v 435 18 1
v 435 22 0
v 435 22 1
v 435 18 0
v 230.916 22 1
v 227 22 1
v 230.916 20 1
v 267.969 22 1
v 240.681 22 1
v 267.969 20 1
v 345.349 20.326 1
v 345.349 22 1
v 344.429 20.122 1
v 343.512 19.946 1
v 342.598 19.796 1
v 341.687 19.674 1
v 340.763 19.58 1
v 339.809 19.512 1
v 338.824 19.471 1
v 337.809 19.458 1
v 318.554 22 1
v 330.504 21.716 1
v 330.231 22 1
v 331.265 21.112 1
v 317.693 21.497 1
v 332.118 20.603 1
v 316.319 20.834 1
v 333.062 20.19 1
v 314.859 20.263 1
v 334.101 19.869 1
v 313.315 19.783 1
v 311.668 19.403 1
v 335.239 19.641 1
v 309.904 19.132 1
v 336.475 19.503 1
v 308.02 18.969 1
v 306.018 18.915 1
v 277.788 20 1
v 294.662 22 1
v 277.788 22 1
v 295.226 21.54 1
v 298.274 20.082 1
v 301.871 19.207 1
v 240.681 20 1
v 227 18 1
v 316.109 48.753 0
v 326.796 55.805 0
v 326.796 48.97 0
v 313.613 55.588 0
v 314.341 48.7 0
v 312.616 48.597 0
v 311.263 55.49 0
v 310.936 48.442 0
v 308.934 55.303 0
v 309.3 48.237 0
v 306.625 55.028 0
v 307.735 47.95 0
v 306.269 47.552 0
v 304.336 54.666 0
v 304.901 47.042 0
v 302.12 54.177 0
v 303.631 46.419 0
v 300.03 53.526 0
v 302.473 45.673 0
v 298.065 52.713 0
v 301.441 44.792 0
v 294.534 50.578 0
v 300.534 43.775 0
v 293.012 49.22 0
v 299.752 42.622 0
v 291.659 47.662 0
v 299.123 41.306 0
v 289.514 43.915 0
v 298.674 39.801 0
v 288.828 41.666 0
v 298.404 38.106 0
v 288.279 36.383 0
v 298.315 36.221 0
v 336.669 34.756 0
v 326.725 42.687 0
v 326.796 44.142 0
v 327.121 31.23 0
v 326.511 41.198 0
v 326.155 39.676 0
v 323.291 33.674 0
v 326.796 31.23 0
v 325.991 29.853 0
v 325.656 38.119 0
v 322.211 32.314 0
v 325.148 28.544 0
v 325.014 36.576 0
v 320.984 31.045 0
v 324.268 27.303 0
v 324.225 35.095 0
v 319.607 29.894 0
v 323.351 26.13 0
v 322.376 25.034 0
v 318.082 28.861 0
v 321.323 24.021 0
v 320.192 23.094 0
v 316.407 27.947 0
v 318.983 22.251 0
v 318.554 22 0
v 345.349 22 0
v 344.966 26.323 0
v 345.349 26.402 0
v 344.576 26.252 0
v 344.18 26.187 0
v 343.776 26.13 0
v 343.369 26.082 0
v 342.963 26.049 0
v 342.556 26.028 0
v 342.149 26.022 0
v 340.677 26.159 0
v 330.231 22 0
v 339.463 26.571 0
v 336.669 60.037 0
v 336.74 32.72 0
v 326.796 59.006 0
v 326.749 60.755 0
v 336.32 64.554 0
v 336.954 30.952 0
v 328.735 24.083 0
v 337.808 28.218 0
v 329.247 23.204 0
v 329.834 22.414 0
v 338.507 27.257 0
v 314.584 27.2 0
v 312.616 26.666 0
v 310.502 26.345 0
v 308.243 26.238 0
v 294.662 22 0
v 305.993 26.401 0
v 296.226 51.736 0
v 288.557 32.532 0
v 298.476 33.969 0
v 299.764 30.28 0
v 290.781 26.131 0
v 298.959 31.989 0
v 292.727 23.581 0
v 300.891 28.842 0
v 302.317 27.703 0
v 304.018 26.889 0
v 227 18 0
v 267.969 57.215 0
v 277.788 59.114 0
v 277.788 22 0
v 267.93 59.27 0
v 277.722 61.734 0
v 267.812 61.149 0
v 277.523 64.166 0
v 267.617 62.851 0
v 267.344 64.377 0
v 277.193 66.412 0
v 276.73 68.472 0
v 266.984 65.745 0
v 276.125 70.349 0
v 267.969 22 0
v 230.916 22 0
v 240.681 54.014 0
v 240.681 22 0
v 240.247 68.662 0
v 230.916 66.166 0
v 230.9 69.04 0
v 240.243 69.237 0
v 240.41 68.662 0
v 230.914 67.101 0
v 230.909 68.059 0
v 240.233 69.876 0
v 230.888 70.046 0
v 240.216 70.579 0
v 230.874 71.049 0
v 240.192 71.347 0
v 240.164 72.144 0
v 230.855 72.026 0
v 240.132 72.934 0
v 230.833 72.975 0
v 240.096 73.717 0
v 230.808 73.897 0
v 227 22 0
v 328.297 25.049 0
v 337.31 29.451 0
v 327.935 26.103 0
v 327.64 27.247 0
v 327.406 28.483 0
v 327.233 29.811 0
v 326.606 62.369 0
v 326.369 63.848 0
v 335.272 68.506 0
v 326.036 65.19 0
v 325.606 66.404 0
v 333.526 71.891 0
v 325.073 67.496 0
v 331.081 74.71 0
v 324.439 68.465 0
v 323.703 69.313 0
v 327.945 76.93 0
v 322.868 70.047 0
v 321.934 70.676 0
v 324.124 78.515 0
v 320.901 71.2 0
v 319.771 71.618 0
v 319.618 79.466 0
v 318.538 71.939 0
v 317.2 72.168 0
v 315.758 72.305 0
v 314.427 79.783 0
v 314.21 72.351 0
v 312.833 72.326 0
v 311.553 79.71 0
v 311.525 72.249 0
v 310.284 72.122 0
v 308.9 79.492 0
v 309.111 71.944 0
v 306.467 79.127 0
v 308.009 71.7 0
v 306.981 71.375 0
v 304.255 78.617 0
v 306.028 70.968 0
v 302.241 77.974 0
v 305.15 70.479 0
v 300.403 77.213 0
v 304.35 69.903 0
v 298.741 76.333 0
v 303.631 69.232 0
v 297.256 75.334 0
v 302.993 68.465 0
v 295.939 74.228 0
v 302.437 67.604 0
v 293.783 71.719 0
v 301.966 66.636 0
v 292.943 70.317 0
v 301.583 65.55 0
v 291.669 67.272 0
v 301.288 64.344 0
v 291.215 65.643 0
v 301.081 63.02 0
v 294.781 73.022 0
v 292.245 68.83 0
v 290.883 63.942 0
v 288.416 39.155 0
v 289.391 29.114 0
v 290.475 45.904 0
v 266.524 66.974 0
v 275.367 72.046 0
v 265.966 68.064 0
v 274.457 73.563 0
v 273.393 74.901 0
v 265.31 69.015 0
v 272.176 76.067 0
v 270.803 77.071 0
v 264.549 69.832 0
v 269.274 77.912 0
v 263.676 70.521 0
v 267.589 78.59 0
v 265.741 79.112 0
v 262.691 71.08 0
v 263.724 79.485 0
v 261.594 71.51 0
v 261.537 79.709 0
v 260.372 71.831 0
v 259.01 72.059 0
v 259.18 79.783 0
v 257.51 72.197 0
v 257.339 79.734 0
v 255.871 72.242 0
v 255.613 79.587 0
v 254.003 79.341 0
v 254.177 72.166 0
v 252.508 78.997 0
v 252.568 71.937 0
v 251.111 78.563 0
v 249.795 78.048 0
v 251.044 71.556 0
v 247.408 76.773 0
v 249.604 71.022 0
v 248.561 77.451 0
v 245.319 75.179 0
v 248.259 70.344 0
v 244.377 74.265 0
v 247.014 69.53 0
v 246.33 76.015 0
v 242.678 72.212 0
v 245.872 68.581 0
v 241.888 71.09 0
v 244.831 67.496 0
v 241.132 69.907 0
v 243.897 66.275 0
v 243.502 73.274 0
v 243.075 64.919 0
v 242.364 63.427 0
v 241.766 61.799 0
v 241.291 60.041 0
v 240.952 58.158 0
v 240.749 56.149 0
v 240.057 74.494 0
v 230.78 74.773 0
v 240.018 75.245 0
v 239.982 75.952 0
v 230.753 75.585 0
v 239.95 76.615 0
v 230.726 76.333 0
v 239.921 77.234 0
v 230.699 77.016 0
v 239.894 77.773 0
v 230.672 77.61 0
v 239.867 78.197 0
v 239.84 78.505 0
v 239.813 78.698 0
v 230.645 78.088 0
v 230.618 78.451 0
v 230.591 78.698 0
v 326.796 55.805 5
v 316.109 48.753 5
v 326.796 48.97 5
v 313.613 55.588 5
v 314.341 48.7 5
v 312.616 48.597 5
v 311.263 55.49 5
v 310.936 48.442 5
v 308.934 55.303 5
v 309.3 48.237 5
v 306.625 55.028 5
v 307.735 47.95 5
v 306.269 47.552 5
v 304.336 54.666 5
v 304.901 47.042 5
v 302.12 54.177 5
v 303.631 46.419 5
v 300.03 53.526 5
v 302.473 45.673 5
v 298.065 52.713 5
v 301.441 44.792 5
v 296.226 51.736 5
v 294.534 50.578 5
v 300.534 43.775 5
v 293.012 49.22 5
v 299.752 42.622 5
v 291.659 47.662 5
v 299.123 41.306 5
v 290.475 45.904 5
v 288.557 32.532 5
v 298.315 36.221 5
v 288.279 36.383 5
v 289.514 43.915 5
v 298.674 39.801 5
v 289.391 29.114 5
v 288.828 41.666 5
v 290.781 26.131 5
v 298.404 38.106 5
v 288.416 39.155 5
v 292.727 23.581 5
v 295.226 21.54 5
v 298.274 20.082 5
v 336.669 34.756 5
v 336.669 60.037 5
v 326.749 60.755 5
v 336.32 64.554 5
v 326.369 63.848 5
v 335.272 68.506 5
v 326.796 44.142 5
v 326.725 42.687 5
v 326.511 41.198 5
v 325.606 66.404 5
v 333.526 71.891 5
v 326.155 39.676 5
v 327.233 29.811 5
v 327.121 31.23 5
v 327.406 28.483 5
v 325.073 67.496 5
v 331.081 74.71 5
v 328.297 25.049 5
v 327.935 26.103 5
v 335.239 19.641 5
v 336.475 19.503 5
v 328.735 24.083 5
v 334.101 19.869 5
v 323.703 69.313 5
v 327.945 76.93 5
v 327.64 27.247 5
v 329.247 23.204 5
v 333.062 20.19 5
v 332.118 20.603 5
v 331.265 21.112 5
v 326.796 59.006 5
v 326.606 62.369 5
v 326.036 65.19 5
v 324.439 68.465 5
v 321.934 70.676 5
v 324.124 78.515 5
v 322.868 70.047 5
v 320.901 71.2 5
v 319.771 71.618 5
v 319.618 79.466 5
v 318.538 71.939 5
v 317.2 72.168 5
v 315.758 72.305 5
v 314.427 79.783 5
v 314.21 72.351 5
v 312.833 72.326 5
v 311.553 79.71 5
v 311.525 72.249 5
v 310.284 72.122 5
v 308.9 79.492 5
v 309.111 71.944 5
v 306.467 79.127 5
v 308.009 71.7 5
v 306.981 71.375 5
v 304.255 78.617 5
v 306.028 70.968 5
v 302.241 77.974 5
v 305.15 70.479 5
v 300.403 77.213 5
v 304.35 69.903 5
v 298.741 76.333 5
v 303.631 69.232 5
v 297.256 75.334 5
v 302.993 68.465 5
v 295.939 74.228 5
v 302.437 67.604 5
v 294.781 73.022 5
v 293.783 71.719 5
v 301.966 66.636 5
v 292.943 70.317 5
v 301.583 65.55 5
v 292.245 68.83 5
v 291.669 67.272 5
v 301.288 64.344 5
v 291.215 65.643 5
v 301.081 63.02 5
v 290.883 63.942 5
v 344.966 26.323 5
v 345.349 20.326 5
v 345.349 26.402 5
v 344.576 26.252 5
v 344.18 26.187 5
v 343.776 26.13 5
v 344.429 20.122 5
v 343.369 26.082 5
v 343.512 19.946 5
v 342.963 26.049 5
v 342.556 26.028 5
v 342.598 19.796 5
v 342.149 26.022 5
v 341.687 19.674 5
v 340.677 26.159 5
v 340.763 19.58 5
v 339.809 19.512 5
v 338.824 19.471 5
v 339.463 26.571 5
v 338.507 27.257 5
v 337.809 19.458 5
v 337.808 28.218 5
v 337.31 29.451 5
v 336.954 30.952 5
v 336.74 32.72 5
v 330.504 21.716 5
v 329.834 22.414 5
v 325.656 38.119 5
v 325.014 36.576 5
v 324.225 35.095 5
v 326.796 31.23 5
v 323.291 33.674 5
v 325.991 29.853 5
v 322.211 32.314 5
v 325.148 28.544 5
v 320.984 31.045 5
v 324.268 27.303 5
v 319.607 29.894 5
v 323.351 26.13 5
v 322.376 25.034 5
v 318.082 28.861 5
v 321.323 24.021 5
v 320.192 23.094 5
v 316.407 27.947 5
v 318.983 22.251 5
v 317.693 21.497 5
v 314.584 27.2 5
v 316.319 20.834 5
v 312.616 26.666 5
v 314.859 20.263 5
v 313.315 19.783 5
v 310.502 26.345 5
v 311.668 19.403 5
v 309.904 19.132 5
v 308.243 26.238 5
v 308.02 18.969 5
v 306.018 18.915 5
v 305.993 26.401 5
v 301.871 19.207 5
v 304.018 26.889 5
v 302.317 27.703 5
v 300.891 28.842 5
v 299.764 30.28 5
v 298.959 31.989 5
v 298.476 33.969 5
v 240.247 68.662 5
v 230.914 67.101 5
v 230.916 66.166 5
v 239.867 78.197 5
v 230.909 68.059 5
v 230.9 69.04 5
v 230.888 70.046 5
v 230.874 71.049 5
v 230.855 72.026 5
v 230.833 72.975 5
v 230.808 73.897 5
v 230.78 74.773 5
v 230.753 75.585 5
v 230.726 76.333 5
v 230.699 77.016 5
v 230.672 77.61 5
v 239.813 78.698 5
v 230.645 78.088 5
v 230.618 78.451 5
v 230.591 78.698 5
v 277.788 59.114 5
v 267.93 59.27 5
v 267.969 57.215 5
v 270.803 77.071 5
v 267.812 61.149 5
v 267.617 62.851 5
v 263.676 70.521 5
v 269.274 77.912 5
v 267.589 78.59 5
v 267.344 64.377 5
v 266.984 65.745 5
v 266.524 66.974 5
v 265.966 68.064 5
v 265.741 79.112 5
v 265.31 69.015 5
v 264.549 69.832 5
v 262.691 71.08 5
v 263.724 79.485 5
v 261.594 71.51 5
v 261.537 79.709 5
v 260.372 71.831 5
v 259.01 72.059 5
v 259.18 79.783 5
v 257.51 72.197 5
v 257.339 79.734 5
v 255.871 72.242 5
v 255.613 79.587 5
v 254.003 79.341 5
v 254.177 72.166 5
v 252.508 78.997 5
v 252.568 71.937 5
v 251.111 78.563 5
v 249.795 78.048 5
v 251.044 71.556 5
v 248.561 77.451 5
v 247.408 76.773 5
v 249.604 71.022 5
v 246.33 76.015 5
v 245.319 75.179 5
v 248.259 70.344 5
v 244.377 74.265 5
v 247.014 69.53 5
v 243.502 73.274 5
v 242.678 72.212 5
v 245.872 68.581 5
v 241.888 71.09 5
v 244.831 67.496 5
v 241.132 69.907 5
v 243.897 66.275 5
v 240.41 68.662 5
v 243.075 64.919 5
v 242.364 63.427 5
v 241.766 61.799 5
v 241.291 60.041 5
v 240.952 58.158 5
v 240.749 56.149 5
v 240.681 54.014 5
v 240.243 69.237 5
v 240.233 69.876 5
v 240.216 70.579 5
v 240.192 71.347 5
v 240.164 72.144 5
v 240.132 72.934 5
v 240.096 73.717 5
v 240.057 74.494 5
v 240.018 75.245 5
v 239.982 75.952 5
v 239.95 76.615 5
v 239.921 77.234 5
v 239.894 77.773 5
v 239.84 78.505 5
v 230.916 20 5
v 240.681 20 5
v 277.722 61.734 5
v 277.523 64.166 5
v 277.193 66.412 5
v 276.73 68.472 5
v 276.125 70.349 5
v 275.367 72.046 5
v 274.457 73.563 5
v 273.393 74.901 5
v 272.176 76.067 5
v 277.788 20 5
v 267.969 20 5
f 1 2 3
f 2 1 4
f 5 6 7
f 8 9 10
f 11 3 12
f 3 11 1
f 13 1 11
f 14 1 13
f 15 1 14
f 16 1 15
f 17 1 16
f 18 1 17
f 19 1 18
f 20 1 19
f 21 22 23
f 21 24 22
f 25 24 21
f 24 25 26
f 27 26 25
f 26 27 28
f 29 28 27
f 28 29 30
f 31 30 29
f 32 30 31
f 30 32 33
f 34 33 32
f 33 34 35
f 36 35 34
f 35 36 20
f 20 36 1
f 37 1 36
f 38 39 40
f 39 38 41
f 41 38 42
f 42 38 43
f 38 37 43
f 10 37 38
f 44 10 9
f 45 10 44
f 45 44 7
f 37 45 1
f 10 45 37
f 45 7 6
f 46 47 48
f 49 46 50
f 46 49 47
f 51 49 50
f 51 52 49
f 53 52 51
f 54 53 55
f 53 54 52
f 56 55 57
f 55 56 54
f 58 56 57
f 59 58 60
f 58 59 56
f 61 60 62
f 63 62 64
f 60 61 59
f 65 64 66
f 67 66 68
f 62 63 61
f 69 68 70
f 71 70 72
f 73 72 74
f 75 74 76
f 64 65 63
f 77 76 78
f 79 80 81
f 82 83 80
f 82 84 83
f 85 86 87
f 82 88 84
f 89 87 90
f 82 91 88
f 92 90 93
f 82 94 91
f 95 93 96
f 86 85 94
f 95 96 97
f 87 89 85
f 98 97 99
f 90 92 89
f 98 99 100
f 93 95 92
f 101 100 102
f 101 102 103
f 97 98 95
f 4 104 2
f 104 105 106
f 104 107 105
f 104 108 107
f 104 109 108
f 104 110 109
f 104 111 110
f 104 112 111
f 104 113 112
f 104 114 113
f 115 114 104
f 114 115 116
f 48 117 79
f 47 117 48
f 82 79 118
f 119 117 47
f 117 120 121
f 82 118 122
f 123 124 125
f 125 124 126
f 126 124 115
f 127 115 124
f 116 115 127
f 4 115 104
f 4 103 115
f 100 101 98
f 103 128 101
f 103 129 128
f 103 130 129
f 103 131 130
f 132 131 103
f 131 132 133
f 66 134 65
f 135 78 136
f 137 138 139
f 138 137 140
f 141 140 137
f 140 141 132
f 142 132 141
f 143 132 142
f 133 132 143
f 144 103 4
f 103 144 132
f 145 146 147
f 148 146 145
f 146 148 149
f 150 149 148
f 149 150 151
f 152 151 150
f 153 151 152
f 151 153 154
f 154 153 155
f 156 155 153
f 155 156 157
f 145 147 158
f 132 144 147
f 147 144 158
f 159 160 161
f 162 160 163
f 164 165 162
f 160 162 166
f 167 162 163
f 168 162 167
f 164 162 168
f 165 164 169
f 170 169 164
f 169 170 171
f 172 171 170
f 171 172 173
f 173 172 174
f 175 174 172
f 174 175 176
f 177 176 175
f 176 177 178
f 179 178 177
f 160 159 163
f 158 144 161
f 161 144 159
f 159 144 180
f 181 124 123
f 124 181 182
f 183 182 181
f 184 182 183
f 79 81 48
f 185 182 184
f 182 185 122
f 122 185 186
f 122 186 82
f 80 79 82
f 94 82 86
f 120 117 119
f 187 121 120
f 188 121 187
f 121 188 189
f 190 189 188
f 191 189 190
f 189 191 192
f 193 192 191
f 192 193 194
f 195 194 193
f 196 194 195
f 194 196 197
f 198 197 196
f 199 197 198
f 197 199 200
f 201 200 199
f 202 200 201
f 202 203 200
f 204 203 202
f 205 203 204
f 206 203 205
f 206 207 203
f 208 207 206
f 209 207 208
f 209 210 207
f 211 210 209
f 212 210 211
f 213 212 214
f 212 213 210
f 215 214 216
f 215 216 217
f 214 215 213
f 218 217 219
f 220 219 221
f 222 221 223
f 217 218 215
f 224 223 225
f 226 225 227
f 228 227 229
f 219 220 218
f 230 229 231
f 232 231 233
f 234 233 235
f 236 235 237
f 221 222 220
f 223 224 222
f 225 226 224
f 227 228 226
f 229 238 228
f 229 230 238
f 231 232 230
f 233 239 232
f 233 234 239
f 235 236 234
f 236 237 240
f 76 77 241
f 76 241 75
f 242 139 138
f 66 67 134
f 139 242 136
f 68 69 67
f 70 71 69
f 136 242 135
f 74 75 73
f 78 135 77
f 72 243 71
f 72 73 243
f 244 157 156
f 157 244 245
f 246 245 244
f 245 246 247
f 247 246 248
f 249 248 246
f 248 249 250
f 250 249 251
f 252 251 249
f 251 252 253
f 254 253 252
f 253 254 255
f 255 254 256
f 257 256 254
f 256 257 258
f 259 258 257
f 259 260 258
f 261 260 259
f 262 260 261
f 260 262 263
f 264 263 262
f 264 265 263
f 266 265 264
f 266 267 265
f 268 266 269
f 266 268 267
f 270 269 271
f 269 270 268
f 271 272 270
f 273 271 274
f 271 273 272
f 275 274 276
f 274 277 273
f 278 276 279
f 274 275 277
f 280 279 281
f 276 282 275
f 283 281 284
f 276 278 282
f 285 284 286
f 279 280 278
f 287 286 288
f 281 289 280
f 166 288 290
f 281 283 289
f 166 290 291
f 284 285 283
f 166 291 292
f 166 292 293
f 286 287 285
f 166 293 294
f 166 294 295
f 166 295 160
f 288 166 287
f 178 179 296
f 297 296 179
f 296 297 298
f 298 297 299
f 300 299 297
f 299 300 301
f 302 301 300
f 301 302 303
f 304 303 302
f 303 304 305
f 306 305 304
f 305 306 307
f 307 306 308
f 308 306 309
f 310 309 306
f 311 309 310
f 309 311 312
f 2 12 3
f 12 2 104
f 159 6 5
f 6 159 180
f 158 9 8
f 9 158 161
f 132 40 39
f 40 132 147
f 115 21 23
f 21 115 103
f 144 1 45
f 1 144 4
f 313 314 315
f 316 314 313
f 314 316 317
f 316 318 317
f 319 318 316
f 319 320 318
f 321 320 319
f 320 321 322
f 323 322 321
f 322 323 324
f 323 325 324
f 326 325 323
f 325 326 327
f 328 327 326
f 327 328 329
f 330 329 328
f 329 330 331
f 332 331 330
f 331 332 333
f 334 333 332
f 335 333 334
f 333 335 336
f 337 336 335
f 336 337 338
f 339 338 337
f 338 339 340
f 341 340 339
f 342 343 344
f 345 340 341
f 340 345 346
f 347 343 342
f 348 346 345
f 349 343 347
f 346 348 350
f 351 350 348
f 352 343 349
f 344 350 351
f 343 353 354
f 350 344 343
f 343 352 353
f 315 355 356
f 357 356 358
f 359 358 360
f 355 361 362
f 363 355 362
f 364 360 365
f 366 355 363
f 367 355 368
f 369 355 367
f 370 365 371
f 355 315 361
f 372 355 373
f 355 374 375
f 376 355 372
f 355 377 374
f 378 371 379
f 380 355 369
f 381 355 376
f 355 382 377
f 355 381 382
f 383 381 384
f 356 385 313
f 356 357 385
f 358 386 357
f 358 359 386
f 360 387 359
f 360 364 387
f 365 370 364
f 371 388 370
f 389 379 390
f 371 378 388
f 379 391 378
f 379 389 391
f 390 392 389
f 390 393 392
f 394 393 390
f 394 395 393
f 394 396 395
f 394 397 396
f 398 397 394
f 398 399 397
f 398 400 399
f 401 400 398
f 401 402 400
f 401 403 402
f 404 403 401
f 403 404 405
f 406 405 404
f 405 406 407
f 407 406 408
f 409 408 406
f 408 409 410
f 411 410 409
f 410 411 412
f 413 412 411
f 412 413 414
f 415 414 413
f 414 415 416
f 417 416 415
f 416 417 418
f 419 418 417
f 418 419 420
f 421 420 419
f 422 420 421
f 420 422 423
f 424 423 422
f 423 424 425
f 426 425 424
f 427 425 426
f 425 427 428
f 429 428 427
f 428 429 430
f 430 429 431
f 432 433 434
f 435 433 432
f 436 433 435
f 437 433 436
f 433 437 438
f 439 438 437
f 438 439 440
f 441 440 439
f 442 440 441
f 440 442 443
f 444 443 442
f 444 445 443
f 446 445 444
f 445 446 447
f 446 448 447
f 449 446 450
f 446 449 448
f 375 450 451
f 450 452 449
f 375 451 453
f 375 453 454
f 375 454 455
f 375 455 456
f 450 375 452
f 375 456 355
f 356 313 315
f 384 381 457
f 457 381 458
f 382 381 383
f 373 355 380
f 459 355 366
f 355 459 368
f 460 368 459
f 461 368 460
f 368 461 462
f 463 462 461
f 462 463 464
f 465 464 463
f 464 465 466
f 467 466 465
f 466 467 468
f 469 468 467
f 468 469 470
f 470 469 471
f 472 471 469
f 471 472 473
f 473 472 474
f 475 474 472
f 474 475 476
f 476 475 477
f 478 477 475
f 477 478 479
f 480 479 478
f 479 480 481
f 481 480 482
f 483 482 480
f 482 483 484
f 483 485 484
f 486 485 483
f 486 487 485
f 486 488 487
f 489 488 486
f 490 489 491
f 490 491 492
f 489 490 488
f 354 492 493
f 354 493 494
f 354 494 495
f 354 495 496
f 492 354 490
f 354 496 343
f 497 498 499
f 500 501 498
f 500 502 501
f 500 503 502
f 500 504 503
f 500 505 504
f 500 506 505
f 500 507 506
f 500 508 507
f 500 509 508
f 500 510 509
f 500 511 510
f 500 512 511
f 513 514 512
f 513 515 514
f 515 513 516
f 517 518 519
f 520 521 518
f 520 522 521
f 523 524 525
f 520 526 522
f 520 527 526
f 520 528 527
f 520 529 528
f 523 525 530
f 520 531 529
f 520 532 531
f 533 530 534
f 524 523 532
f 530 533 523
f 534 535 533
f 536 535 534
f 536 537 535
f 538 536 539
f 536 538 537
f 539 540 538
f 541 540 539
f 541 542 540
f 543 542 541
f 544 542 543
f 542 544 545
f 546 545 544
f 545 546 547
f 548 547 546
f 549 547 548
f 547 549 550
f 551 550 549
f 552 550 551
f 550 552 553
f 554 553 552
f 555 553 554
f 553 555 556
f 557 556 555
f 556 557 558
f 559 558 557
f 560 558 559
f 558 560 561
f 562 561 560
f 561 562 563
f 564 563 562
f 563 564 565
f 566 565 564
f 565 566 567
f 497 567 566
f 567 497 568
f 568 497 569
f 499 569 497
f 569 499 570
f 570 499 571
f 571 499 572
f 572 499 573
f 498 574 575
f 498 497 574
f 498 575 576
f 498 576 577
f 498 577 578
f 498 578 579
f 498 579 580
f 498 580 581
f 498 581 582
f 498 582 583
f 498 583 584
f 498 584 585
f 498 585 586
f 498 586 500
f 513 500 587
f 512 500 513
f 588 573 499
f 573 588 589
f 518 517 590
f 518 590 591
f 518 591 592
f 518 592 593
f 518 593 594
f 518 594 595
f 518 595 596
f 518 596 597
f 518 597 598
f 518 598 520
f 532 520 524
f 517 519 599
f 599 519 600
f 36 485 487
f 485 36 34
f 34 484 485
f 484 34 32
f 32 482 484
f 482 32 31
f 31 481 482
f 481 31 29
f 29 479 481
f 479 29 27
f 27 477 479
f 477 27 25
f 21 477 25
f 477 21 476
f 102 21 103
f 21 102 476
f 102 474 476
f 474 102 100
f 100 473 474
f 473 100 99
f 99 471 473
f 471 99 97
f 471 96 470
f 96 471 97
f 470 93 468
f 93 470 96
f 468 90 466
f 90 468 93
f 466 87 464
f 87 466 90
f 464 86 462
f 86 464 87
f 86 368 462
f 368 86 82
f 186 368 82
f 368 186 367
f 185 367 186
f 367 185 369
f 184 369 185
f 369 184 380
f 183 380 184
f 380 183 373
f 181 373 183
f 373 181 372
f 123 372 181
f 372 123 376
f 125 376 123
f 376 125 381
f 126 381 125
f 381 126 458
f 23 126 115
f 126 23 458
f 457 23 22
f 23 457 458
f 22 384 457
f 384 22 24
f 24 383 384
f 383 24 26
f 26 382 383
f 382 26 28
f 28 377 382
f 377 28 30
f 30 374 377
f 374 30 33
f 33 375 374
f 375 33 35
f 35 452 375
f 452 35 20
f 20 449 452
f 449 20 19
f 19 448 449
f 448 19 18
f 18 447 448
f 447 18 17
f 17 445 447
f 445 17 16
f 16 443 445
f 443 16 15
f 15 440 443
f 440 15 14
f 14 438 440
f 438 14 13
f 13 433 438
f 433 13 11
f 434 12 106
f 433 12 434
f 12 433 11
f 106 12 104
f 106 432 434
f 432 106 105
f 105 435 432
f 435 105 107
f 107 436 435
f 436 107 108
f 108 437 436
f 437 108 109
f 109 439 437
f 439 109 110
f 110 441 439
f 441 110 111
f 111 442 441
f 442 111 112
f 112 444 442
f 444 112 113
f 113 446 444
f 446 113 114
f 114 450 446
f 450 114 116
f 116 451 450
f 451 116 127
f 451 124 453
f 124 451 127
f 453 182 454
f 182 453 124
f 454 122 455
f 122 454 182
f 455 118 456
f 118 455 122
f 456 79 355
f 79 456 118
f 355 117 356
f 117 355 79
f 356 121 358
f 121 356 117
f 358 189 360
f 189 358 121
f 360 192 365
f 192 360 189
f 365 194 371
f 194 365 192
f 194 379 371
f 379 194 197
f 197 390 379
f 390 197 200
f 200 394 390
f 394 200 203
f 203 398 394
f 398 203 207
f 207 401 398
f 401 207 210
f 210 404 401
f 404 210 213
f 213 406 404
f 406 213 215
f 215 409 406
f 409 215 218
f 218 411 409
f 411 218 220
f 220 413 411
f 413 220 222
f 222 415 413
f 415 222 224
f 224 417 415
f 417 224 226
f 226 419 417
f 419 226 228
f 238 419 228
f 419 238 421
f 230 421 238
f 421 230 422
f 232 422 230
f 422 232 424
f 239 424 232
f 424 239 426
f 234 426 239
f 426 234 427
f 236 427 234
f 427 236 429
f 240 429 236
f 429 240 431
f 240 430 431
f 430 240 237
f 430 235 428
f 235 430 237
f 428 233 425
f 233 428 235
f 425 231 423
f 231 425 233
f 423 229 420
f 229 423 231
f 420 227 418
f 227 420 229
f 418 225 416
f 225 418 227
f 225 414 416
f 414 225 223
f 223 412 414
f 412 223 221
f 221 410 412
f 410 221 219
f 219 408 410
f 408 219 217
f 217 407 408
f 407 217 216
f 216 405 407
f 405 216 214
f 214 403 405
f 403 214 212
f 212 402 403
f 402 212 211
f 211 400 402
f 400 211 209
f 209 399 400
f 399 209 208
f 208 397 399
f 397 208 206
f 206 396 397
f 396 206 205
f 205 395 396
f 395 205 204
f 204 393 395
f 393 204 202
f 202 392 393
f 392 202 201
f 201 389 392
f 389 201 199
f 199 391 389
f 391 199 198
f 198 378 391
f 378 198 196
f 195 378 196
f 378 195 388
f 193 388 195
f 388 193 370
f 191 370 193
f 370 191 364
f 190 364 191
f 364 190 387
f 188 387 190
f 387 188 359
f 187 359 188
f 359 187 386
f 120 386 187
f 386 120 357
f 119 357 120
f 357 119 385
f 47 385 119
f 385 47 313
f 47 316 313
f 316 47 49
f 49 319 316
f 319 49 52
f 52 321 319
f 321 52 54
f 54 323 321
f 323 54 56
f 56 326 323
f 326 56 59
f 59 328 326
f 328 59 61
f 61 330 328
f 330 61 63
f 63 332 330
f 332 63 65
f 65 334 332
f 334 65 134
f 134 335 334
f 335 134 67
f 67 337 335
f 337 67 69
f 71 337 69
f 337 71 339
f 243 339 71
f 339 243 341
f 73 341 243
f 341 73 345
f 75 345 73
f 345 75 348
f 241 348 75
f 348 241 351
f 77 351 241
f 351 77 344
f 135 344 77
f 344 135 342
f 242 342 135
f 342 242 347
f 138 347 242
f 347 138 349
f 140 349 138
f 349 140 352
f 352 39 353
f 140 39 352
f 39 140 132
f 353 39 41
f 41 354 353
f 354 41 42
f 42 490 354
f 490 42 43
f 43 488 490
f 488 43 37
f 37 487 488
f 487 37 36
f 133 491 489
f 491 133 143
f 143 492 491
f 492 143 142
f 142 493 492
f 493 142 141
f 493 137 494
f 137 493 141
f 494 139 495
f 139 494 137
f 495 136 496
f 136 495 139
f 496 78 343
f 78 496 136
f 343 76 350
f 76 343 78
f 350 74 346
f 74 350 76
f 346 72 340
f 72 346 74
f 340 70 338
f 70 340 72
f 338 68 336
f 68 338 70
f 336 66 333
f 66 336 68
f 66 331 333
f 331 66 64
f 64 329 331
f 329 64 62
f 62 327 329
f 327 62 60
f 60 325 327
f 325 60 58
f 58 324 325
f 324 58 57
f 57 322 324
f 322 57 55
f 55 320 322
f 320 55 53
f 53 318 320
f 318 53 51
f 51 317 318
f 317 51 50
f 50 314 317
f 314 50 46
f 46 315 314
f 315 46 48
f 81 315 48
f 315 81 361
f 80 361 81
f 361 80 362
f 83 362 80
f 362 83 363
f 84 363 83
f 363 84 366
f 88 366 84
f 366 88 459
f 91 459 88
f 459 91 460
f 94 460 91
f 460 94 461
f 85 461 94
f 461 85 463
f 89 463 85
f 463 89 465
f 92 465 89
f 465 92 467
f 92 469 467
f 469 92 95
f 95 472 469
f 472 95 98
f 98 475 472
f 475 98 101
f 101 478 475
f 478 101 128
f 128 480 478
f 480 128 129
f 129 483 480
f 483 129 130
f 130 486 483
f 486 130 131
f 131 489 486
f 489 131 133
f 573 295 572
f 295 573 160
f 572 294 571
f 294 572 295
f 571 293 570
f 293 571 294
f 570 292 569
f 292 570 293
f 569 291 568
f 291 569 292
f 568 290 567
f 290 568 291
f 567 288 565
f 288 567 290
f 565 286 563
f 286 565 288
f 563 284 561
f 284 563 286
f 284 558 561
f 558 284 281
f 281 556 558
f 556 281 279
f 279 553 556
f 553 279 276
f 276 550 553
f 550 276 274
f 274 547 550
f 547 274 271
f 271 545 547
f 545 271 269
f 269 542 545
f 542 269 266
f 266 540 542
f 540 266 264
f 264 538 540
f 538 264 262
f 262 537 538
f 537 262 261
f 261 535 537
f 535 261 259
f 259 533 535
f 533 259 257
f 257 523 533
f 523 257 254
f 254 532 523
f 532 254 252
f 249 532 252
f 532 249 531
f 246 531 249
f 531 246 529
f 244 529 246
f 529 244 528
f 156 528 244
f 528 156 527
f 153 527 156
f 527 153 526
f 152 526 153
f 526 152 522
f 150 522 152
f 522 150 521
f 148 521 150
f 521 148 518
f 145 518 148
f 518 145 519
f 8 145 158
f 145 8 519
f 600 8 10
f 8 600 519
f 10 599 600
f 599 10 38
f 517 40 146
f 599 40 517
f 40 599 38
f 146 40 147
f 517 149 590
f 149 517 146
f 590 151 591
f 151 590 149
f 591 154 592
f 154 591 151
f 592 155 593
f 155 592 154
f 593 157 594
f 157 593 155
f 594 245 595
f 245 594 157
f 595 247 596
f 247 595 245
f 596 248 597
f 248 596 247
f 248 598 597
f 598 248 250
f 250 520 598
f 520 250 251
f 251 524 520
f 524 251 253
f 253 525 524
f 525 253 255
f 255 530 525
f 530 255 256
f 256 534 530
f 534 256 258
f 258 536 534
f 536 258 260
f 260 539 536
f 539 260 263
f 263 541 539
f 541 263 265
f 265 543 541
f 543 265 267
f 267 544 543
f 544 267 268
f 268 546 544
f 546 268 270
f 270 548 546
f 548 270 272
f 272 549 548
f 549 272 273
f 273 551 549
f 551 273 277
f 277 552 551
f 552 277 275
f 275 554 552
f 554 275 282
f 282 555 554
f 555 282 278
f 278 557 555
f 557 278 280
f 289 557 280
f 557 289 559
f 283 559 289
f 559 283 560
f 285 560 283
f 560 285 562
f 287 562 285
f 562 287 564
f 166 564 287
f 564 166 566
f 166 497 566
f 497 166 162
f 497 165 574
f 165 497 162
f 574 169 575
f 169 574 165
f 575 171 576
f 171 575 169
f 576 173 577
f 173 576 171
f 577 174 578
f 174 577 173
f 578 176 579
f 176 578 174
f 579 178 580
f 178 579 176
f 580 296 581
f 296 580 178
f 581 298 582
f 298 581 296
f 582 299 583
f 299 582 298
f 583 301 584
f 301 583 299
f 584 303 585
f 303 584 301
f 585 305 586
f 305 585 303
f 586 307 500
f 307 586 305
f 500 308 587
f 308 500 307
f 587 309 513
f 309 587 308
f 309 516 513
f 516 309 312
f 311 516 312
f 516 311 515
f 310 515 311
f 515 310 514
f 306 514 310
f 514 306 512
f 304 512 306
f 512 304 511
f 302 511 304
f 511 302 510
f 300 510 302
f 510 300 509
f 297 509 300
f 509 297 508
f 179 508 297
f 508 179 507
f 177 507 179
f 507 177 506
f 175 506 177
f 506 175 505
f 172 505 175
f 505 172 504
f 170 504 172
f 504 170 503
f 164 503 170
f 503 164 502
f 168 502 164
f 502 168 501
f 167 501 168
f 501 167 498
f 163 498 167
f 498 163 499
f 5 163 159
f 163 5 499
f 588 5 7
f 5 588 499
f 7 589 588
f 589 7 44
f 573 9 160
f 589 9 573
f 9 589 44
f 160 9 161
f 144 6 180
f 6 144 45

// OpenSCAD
logo_base_size=454;
logo_base_height=logo_base_size*.25;

pillar_z_offset = 2;
pillar_7_x_scale = .25;
pillar_7_z_scale =  5;

pillar_spacing = .1;
pillar_vs_base_scaling_factor = .6;

normal_pillar_base = .15;
wide_pillar_base = .25;


%cube([logo_base_size, logo_base_height,1.6]);
analytics_pillar_support_height = 230;


text_z=5;

difference(){
    union(){
        translate([0,18,0])
        cube([435,4,1]);

        translate([0,20,0])
        linear_extrude(height = text_z)
        text("Athena", font = "Liberation Sans", size=80);
                
        translate([340,7,0])
        resize([80,80])
        linear_extrude(height = text_z)
        import("/Users/virtuoso/Downloads/Athena_logo_pre_processed.dxf");
    }

    translate([0,-10,-10])
    cube([logo_base_size/2,300,300]);
}
